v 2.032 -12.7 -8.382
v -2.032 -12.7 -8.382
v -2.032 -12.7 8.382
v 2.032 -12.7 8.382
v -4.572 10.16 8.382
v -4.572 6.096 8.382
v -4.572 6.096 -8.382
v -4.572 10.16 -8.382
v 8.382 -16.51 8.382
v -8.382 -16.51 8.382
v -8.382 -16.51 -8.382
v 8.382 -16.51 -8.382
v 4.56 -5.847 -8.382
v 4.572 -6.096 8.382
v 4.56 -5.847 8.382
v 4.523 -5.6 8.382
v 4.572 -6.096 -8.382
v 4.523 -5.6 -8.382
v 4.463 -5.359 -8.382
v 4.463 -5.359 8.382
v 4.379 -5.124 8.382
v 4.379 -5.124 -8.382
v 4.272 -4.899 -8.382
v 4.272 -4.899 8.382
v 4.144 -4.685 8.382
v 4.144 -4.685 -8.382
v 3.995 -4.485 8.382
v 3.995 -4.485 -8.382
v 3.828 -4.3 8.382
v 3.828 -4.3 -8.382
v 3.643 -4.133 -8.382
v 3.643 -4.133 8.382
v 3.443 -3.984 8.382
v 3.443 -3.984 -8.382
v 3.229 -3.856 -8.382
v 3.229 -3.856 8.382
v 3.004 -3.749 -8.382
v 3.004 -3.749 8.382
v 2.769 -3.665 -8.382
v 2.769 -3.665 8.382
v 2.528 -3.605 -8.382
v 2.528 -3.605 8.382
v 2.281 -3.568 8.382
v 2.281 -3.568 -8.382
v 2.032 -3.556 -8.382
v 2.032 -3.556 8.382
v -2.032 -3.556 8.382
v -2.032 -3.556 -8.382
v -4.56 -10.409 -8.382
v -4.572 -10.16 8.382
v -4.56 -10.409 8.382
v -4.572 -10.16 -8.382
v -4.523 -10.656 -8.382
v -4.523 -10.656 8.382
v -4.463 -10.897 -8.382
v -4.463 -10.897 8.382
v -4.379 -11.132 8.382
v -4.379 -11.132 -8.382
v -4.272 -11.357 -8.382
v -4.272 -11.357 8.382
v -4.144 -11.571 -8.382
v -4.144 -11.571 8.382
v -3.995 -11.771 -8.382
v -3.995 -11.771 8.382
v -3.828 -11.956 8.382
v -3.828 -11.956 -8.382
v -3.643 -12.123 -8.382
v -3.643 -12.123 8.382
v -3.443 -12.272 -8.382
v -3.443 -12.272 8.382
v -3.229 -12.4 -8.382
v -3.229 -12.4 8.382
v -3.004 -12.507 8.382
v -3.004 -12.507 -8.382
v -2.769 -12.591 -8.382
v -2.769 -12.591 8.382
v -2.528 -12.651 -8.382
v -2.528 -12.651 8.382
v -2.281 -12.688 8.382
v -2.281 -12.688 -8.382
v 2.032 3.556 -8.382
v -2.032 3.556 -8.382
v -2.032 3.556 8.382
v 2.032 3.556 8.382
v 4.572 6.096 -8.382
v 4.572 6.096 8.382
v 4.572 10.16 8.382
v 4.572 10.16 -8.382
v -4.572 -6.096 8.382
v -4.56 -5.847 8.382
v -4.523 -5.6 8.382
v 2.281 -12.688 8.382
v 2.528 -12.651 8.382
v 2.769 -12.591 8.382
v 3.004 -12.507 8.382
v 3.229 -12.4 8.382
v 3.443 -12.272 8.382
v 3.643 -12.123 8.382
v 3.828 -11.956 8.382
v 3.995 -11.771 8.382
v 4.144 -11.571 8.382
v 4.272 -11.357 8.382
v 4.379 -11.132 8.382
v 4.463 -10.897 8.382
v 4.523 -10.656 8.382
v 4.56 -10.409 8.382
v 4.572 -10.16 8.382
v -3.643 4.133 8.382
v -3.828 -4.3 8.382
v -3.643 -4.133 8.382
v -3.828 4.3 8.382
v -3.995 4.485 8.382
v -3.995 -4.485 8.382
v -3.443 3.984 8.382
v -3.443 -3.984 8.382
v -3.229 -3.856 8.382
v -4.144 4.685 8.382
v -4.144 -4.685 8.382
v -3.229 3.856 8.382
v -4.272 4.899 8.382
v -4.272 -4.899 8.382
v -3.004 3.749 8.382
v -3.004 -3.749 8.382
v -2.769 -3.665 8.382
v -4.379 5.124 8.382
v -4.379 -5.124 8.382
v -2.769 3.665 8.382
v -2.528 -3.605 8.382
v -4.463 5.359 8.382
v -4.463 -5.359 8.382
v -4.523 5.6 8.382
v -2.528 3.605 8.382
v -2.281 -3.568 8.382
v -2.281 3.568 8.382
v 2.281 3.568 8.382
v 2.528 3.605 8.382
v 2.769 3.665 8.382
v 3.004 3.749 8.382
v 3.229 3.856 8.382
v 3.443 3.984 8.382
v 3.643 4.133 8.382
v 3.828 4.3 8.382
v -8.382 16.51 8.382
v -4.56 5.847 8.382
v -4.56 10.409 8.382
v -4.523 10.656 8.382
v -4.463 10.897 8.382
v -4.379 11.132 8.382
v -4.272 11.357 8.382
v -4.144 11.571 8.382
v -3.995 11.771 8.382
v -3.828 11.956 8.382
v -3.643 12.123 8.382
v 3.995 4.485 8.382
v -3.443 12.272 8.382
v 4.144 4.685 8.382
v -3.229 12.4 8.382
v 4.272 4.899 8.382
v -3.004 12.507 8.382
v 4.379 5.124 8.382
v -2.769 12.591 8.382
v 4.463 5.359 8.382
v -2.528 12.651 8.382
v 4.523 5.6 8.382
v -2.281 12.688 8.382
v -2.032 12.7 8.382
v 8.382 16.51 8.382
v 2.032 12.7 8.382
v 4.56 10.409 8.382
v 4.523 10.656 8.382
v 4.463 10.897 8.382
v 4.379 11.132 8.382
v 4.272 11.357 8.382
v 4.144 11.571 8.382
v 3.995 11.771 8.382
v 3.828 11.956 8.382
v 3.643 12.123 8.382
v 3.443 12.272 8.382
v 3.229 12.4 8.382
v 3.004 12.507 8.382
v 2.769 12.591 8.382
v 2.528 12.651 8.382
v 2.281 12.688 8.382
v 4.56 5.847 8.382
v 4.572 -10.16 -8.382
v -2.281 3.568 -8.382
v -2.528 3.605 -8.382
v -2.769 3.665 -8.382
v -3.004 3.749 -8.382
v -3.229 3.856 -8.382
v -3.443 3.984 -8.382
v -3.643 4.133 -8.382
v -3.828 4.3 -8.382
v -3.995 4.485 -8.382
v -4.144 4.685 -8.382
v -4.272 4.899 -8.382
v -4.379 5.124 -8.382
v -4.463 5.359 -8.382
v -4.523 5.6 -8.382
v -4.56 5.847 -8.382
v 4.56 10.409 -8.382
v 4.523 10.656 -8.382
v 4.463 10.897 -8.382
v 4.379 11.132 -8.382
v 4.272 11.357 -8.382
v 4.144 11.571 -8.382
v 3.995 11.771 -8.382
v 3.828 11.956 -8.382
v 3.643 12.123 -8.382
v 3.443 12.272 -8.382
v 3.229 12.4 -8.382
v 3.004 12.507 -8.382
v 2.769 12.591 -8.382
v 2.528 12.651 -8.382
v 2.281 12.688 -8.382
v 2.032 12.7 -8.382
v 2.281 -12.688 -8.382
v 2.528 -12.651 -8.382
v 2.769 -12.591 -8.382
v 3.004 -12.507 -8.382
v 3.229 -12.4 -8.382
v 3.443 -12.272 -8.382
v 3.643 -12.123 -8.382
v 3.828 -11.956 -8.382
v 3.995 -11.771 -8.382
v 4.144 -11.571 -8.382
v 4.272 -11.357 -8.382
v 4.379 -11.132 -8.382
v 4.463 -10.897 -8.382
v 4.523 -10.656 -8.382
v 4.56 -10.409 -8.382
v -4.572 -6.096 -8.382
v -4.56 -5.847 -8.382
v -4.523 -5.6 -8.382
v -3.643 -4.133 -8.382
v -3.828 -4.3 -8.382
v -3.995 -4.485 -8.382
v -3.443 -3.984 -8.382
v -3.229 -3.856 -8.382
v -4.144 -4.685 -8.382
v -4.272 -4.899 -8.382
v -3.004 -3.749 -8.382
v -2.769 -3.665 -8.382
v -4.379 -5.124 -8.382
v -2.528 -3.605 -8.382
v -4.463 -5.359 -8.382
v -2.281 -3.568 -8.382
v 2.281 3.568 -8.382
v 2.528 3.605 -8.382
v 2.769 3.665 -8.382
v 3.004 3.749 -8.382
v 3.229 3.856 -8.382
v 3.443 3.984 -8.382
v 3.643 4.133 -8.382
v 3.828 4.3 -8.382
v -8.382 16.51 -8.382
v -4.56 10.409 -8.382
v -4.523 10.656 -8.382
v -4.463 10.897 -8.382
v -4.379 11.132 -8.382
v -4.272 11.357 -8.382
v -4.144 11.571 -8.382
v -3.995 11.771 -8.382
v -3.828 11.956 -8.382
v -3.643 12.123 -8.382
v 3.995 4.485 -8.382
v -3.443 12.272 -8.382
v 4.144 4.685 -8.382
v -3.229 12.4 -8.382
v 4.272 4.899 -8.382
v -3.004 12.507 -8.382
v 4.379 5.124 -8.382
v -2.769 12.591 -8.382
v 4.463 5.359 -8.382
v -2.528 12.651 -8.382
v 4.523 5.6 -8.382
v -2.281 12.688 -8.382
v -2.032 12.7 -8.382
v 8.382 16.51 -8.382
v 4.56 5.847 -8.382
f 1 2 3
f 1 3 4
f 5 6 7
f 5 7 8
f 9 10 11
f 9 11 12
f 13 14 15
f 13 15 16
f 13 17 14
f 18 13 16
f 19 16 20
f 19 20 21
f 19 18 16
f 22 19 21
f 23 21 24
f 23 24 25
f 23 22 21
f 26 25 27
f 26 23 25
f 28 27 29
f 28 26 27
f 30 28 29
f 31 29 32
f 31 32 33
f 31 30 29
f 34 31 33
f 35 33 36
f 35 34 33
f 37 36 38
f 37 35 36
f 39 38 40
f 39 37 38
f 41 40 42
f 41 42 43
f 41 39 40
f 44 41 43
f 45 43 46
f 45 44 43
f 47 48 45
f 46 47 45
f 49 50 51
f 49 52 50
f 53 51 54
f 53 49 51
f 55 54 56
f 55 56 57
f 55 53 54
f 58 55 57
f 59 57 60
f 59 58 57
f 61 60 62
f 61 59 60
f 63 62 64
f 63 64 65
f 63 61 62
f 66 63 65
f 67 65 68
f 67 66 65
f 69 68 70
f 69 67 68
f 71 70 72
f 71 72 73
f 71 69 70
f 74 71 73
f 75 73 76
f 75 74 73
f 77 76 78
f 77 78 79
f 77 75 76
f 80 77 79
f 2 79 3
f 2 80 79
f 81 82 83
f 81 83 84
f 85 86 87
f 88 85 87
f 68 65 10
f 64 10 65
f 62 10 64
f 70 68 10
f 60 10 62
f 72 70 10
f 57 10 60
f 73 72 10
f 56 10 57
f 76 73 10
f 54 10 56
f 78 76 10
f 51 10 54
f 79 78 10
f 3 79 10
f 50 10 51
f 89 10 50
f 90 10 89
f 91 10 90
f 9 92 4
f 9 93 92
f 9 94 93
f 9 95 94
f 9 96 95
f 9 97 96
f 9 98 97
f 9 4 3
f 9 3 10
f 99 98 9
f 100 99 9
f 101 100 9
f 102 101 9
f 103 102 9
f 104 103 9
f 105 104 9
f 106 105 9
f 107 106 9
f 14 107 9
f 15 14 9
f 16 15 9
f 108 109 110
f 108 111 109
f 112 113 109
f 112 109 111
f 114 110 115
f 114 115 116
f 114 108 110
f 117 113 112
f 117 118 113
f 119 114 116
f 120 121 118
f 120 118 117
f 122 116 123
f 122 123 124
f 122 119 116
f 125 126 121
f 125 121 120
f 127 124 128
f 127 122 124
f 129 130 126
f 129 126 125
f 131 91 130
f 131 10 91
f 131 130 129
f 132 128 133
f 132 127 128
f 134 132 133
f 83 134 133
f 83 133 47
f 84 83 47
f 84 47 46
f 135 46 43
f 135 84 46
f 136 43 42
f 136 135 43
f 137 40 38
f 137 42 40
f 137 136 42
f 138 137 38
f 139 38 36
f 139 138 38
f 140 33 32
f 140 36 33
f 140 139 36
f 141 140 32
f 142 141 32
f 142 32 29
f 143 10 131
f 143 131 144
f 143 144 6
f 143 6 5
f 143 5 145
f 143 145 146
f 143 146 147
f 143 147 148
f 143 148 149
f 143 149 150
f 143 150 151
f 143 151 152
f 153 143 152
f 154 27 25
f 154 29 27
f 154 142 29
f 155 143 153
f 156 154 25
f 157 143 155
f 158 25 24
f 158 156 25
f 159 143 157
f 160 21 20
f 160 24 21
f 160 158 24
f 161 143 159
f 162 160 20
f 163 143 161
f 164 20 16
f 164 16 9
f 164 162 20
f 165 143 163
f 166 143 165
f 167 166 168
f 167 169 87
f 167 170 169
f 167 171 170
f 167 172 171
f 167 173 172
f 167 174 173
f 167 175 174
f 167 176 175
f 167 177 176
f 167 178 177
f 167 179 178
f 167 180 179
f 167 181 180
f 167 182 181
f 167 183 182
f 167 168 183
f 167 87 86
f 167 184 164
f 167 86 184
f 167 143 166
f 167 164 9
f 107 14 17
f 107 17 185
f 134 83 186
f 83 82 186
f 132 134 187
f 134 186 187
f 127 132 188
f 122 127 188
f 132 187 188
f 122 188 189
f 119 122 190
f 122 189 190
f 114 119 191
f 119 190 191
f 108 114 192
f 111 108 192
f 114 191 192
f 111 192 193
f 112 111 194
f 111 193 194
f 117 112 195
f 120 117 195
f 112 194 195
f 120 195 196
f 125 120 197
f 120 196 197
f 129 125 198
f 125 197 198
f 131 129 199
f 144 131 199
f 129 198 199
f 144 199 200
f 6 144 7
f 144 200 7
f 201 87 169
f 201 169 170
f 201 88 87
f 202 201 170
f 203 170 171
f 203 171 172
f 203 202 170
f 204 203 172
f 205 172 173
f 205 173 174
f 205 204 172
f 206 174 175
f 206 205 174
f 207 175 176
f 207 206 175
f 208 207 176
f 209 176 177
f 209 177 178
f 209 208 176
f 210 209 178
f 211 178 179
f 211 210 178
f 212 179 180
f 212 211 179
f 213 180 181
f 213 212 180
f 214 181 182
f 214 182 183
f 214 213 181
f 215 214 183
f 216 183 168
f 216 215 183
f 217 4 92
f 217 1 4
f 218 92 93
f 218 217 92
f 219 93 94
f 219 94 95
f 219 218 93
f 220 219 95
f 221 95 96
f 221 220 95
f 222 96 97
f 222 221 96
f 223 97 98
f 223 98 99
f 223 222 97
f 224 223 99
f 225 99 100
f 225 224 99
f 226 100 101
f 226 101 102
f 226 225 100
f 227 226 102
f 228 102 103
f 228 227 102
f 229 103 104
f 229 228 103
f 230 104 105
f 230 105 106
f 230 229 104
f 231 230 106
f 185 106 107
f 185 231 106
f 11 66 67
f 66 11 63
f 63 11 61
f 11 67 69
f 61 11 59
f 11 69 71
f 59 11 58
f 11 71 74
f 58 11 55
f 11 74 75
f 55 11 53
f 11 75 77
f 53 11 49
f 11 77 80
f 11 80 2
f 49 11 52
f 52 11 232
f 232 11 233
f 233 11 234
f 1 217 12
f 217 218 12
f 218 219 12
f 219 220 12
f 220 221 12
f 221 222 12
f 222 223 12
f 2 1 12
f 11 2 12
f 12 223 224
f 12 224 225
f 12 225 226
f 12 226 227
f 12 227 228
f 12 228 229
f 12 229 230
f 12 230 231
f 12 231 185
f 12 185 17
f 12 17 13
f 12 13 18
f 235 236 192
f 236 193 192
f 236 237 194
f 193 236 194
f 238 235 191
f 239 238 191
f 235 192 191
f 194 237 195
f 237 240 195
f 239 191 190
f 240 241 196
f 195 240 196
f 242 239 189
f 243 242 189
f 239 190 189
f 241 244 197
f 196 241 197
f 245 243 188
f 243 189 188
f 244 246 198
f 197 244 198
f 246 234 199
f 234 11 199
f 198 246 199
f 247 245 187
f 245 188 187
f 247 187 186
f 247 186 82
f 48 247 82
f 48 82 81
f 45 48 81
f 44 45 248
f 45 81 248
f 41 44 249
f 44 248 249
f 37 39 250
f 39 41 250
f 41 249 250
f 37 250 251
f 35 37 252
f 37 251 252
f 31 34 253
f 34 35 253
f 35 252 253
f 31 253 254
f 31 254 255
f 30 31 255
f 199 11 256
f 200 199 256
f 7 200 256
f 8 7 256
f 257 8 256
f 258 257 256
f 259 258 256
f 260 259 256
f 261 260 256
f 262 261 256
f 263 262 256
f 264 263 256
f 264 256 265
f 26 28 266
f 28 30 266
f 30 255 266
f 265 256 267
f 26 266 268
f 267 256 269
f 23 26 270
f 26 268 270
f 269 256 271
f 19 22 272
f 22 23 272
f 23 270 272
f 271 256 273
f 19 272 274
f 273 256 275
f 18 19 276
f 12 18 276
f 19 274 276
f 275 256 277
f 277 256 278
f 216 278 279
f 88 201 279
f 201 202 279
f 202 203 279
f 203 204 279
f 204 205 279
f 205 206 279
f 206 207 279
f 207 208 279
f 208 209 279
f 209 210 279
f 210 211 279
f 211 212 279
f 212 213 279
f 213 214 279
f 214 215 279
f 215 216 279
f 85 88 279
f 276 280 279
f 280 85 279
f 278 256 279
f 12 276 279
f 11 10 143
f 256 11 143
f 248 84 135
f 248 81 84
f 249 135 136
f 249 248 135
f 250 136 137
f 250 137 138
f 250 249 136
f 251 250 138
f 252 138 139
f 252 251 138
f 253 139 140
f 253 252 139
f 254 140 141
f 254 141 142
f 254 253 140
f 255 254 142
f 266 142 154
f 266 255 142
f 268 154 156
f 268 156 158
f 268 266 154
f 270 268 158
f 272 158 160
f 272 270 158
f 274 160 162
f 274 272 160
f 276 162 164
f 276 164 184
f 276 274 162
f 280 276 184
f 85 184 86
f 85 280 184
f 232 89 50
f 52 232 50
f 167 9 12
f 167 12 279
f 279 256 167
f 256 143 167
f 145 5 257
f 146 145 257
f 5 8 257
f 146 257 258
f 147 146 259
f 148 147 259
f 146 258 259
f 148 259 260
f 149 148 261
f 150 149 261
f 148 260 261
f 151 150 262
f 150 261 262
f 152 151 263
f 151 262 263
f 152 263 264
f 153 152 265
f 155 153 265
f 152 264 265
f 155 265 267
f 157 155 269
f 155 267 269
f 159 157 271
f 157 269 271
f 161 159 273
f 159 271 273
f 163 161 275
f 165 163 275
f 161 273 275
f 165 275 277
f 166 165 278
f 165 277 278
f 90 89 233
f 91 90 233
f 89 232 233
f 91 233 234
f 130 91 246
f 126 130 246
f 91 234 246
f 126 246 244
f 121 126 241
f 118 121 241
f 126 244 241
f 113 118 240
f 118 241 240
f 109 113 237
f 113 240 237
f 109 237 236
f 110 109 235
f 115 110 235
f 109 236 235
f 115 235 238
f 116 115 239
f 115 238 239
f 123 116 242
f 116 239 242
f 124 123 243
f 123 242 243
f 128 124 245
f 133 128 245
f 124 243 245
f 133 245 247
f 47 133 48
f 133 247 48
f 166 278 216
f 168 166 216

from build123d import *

# Parameters (mm, degrees)
F0_W     = 16.764
F0_H     = 33.02
F1_DEPTH = 8.382
F2_W     = 9.144
F2_H     = 9.144
F3_DEPTH = 25.4
F4_R     = 2.54


# Not quite as in the source:
# - two fillets or chamfers of one size are made in one step
# - a pattern or mirror of a feature is missing from the dataset's text; its kind, count and spacing are read off the source's solid


with BuildPart() as f1:
    # F0 (on Top) → F1 (new body, symmetric)
    with BuildSketch(Plane.XY):
        Rectangle(F0_W, F0_H)
    extrude(amount=F1_DEPTH, both=True)

    # F2 (on face) → F3 (cut)
    with BuildSketch(Plane.XY.offset(8.382)):
        with Locations((0, 8.128)):
            Rectangle(F2_W, F2_H)
    f3 = extrude(amount=-F3_DEPTH, mode=Mode.SUBTRACT)

    # F3_copies: F3 across plane
    add(f3.mirror(Plane(origin=(0, 0, 0), x_dir=(0, 0, -1), z_dir=(0, -1, 0))), mode=Mode.SUBTRACT)

    # F4
    f4_edges = [f1.edges().sort_by_distance(p)[0] for p in [
        (-4.572, 12.7, 0),
        (4.572, 12.7, 0),
        (-4.572, 3.556, 0),
        (-4.572, -12.7, 0),
        (4.572, -12.7, 0),
        (4.572, -3.556, 0),
        (-4.572, -3.556, 0),
        (4.572, 3.556, 0),
    ]]
    fillet(f4_edges, radius=F4_R)


solid = f1.part
